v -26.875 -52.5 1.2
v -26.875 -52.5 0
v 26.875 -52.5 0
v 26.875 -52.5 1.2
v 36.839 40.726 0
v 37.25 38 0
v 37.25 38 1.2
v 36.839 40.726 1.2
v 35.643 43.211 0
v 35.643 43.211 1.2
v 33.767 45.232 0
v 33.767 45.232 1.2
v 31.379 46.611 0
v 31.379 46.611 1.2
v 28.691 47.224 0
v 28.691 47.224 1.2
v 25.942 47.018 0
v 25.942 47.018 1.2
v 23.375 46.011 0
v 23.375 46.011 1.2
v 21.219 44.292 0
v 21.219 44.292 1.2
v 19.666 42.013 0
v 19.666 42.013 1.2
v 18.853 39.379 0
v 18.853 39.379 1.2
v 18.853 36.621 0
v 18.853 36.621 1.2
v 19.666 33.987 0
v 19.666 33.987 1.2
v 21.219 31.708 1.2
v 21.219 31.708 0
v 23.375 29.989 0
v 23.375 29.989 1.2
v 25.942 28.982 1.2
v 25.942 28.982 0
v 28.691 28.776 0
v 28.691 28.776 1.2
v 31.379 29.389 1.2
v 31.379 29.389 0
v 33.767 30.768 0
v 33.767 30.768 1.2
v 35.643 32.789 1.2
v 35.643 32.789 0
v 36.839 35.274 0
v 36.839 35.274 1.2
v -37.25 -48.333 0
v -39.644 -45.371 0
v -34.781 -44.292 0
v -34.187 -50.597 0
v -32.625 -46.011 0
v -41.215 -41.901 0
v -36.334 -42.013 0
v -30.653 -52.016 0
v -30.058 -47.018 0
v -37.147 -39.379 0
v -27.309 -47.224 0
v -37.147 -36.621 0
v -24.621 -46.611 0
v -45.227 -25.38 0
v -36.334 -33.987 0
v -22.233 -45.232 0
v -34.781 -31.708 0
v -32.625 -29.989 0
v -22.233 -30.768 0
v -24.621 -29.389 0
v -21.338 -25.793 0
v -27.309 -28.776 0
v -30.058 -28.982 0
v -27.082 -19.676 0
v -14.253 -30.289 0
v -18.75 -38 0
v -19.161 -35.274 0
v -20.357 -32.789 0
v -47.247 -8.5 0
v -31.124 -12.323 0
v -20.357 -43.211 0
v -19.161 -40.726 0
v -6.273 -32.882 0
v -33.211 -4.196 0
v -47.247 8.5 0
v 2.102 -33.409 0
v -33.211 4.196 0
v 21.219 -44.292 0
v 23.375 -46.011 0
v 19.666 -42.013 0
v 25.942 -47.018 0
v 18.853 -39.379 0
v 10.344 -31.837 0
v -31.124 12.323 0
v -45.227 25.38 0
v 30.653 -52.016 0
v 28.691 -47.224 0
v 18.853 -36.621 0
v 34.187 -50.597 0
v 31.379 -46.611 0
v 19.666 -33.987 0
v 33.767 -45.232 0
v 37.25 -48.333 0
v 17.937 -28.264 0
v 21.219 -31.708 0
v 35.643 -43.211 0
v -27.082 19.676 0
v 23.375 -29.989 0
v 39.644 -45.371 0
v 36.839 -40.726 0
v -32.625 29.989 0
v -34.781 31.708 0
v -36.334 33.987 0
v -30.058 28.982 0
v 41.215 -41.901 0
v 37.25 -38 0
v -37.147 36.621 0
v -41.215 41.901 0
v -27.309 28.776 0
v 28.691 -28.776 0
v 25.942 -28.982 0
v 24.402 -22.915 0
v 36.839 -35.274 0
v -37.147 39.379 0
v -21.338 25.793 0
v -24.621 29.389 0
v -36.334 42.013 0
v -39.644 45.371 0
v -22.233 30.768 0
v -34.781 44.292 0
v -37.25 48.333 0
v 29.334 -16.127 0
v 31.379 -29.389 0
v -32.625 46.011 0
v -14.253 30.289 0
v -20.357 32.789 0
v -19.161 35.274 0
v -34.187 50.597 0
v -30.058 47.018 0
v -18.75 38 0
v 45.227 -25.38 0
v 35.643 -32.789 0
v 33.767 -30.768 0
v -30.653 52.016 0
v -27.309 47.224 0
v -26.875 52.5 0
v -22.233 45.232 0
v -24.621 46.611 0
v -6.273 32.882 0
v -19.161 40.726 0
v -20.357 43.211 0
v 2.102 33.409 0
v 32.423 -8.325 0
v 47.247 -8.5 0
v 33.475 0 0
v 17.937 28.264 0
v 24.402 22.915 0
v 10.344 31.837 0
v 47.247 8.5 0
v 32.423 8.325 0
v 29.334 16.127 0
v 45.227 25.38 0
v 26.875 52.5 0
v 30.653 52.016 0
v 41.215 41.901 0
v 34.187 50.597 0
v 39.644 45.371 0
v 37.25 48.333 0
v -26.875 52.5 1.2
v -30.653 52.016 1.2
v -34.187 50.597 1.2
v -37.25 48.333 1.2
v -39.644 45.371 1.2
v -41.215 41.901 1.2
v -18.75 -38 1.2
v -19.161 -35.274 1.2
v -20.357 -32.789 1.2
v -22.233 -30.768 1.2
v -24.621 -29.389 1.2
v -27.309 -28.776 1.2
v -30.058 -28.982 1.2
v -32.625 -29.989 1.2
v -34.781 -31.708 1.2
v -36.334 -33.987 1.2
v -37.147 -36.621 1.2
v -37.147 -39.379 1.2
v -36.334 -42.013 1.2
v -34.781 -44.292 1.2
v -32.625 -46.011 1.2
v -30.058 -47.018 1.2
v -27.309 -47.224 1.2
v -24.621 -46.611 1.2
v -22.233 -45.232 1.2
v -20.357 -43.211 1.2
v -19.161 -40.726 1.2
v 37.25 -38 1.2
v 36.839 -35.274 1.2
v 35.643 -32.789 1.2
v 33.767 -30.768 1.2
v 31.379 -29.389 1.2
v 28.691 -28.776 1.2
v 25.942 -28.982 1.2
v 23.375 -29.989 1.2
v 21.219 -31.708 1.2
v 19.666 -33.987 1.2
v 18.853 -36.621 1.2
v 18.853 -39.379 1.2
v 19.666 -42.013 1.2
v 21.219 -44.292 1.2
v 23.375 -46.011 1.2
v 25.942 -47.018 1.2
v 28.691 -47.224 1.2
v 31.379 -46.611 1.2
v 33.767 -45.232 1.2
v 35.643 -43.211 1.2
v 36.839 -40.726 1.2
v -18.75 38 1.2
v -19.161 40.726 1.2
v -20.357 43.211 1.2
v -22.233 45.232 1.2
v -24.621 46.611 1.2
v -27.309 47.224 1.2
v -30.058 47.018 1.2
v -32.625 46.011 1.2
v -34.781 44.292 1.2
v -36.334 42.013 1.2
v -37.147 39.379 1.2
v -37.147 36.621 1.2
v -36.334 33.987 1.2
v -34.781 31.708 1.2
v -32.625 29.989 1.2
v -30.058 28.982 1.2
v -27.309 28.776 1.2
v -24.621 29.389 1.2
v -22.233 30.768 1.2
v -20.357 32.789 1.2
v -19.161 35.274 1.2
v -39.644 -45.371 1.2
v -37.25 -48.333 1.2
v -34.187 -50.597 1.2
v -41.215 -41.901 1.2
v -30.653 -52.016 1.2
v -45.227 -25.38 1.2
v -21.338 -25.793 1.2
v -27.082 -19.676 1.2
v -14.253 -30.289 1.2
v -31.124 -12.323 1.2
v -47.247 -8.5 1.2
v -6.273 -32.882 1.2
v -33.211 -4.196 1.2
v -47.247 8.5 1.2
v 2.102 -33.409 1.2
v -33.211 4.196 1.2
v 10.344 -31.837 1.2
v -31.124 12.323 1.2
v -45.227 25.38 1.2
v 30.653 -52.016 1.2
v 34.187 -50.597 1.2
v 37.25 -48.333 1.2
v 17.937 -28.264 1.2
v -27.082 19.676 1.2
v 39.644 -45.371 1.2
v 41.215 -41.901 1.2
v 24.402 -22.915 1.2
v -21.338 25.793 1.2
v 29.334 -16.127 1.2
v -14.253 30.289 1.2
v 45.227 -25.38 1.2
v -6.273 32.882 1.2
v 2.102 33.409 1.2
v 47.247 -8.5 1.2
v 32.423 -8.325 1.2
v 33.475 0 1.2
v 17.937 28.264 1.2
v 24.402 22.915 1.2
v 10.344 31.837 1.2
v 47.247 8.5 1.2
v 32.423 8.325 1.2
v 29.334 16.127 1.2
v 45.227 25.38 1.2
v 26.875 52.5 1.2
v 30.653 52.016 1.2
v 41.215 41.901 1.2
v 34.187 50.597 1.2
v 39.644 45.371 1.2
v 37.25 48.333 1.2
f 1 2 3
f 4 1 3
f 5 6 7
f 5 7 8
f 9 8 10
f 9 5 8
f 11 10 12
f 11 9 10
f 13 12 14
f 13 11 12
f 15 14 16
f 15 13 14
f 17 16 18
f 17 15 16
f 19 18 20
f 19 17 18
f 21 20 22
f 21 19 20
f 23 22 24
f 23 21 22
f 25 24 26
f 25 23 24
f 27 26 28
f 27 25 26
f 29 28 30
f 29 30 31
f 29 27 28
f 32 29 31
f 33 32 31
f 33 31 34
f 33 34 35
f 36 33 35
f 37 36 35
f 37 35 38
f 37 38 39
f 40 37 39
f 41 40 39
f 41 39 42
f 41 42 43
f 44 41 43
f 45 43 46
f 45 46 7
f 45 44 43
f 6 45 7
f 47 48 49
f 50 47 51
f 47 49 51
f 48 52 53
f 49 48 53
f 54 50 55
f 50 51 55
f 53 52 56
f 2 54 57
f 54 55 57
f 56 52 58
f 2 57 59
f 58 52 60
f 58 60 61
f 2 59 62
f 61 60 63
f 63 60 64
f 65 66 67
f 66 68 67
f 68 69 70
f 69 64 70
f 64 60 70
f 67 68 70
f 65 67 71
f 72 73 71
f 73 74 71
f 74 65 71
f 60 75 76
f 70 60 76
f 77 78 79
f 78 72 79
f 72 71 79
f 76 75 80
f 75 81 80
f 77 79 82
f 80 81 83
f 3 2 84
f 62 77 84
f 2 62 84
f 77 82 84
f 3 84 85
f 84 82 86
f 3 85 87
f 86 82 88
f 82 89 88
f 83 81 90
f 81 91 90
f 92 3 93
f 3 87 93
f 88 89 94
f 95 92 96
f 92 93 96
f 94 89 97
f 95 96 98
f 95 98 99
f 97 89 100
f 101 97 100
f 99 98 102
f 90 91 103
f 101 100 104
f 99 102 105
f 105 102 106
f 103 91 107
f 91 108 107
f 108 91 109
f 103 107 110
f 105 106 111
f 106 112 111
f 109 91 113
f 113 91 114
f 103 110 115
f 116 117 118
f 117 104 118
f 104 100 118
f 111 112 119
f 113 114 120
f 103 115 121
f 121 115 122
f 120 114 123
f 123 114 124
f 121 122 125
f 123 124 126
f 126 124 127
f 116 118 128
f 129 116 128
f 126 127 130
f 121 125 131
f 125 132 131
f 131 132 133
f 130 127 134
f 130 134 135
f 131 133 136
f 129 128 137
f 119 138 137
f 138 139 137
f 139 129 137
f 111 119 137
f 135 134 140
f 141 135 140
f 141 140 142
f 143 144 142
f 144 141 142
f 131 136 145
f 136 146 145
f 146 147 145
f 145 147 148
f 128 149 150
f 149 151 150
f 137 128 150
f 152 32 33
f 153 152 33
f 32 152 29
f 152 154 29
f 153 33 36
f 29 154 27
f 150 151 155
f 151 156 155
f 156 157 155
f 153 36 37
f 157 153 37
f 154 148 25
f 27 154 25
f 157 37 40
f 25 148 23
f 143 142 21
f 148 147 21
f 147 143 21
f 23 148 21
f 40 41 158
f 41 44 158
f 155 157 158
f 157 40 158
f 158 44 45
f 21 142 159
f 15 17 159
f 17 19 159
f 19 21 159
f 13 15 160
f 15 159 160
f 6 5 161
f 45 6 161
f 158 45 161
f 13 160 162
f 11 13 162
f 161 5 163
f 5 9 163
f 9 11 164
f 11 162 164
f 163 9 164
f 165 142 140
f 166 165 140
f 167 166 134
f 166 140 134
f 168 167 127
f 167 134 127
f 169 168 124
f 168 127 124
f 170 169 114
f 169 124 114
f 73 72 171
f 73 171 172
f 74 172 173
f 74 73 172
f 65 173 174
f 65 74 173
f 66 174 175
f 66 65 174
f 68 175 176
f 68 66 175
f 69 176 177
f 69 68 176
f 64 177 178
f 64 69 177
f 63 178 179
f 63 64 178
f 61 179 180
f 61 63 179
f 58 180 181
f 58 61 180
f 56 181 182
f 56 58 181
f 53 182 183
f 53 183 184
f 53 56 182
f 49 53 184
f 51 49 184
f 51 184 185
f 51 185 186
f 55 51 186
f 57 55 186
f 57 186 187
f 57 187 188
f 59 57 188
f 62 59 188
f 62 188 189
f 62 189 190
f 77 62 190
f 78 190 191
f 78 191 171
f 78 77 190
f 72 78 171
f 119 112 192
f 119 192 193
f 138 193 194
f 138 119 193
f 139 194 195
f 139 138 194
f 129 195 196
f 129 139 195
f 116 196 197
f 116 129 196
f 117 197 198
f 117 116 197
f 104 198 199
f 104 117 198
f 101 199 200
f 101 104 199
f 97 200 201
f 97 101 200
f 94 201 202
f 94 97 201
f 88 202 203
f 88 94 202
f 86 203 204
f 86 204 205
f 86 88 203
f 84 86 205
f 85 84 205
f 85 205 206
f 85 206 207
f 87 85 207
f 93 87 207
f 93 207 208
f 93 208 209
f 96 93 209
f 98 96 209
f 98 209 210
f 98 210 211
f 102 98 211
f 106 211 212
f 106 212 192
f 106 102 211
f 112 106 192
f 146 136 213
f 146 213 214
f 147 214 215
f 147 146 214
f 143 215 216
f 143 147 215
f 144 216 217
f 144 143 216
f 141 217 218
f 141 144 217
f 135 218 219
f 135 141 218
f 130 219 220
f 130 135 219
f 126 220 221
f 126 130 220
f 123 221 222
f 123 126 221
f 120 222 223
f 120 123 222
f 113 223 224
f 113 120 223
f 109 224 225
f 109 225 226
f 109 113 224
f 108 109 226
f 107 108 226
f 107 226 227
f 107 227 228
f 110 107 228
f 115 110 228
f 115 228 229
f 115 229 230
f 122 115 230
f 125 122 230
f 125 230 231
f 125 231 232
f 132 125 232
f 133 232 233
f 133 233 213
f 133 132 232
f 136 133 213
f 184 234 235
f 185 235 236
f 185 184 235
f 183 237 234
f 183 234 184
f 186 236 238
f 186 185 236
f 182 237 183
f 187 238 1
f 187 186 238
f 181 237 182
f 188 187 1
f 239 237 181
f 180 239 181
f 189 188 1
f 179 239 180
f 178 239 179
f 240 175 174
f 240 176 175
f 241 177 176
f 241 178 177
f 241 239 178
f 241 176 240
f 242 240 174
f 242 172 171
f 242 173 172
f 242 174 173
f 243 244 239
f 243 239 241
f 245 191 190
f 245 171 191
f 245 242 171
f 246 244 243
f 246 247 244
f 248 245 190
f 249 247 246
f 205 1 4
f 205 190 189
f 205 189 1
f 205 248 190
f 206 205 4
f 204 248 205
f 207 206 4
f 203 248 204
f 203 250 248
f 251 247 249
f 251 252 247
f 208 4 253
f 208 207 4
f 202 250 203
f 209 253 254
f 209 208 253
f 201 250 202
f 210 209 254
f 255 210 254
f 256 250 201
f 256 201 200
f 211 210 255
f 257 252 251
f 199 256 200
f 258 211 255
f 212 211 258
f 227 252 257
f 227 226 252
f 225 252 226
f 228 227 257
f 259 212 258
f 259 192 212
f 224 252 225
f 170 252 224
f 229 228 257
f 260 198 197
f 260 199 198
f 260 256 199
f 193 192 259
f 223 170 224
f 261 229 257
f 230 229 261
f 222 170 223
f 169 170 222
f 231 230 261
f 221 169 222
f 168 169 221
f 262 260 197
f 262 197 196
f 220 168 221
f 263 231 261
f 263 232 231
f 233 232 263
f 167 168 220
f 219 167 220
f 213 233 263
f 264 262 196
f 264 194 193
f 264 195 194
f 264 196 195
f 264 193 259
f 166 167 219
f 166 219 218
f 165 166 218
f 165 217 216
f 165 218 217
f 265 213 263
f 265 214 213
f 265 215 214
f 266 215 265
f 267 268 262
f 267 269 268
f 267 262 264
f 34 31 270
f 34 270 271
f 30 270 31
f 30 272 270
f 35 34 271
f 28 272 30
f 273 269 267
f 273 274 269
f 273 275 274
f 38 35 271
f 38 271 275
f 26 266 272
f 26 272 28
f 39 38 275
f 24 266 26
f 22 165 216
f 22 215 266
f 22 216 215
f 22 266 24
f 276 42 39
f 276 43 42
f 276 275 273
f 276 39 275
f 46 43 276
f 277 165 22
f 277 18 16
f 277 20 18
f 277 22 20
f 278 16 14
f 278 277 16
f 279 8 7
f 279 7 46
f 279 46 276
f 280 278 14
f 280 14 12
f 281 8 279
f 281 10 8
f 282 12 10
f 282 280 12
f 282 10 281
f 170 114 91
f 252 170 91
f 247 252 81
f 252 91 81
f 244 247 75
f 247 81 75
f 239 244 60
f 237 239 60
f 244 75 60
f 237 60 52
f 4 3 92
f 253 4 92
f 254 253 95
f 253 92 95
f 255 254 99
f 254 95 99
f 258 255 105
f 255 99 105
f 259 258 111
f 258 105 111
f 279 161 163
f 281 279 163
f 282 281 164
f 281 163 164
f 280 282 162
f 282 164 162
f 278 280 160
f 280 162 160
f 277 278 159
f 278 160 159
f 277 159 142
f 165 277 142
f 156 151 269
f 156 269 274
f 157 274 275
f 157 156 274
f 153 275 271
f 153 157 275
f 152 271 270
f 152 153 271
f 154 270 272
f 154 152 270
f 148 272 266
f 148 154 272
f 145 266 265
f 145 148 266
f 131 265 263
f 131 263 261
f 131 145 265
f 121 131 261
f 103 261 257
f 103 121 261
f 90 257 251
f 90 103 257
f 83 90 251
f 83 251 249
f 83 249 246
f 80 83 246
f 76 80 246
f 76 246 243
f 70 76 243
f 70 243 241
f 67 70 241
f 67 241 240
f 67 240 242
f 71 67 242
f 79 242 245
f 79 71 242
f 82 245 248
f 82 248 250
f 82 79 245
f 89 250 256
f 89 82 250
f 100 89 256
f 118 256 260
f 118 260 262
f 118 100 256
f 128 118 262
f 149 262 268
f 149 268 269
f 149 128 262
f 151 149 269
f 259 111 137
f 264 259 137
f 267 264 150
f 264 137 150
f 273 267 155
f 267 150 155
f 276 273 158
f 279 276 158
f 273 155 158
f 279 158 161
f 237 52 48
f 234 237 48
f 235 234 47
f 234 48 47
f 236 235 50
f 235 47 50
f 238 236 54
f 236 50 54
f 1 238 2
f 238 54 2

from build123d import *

# Parameters (mm, degrees)
SKETCH1_R      = 9.25
SKETCH1_R_2    = 33.475
EXTRUDE2_DEPTH = 1.2


with BuildPart() as part:
    # Sketch1 → Extrude2 (new body)
    with BuildSketch(Plane.XY):
        with BuildLine():
            Line((-26.875, -52.5), (26.875, -52.5))
            ThreePointArc((26.875, -52.5), (35.790865916, -49.562642122), (41.214853301, -41.900977995))
            ThreePointArc((41.214853301, -41.900977995), (47.5, 0), (41.214853301, 41.900977995))
            ThreePointArc((41.214853301, 41.900977995), (35.790865916, 49.562642122), (26.875, 52.5))
            Line((26.875, 52.5), (-26.875, 52.5))
            ThreePointArc((-26.875, 52.5), (-35.790865916, 49.562642122), (-41.214853301, 41.900977995))
            ThreePointArc((-41.214853301, 41.900977995), (-47.5, 0), (-41.214853301, -41.900977995))
            ThreePointArc((-41.214853301, -41.900977995), (-35.790865916, -49.562642122), (-26.875, -52.5))
        make_face()
        with Locations((-28, -38)):
            Circle(SKETCH1_R, mode=Mode.SUBTRACT)
        with Locations((28, -38)):
            Circle(SKETCH1_R, mode=Mode.SUBTRACT)
        with Locations((28, 38)):
            Circle(SKETCH1_R, mode=Mode.SUBTRACT)
        with Locations((-28, 38)):
            Circle(SKETCH1_R, mode=Mode.SUBTRACT)
        Circle(SKETCH1_R_2, mode=Mode.SUBTRACT)
    extrude(amount=EXTRUDE2_DEPTH)


solid = part.part
